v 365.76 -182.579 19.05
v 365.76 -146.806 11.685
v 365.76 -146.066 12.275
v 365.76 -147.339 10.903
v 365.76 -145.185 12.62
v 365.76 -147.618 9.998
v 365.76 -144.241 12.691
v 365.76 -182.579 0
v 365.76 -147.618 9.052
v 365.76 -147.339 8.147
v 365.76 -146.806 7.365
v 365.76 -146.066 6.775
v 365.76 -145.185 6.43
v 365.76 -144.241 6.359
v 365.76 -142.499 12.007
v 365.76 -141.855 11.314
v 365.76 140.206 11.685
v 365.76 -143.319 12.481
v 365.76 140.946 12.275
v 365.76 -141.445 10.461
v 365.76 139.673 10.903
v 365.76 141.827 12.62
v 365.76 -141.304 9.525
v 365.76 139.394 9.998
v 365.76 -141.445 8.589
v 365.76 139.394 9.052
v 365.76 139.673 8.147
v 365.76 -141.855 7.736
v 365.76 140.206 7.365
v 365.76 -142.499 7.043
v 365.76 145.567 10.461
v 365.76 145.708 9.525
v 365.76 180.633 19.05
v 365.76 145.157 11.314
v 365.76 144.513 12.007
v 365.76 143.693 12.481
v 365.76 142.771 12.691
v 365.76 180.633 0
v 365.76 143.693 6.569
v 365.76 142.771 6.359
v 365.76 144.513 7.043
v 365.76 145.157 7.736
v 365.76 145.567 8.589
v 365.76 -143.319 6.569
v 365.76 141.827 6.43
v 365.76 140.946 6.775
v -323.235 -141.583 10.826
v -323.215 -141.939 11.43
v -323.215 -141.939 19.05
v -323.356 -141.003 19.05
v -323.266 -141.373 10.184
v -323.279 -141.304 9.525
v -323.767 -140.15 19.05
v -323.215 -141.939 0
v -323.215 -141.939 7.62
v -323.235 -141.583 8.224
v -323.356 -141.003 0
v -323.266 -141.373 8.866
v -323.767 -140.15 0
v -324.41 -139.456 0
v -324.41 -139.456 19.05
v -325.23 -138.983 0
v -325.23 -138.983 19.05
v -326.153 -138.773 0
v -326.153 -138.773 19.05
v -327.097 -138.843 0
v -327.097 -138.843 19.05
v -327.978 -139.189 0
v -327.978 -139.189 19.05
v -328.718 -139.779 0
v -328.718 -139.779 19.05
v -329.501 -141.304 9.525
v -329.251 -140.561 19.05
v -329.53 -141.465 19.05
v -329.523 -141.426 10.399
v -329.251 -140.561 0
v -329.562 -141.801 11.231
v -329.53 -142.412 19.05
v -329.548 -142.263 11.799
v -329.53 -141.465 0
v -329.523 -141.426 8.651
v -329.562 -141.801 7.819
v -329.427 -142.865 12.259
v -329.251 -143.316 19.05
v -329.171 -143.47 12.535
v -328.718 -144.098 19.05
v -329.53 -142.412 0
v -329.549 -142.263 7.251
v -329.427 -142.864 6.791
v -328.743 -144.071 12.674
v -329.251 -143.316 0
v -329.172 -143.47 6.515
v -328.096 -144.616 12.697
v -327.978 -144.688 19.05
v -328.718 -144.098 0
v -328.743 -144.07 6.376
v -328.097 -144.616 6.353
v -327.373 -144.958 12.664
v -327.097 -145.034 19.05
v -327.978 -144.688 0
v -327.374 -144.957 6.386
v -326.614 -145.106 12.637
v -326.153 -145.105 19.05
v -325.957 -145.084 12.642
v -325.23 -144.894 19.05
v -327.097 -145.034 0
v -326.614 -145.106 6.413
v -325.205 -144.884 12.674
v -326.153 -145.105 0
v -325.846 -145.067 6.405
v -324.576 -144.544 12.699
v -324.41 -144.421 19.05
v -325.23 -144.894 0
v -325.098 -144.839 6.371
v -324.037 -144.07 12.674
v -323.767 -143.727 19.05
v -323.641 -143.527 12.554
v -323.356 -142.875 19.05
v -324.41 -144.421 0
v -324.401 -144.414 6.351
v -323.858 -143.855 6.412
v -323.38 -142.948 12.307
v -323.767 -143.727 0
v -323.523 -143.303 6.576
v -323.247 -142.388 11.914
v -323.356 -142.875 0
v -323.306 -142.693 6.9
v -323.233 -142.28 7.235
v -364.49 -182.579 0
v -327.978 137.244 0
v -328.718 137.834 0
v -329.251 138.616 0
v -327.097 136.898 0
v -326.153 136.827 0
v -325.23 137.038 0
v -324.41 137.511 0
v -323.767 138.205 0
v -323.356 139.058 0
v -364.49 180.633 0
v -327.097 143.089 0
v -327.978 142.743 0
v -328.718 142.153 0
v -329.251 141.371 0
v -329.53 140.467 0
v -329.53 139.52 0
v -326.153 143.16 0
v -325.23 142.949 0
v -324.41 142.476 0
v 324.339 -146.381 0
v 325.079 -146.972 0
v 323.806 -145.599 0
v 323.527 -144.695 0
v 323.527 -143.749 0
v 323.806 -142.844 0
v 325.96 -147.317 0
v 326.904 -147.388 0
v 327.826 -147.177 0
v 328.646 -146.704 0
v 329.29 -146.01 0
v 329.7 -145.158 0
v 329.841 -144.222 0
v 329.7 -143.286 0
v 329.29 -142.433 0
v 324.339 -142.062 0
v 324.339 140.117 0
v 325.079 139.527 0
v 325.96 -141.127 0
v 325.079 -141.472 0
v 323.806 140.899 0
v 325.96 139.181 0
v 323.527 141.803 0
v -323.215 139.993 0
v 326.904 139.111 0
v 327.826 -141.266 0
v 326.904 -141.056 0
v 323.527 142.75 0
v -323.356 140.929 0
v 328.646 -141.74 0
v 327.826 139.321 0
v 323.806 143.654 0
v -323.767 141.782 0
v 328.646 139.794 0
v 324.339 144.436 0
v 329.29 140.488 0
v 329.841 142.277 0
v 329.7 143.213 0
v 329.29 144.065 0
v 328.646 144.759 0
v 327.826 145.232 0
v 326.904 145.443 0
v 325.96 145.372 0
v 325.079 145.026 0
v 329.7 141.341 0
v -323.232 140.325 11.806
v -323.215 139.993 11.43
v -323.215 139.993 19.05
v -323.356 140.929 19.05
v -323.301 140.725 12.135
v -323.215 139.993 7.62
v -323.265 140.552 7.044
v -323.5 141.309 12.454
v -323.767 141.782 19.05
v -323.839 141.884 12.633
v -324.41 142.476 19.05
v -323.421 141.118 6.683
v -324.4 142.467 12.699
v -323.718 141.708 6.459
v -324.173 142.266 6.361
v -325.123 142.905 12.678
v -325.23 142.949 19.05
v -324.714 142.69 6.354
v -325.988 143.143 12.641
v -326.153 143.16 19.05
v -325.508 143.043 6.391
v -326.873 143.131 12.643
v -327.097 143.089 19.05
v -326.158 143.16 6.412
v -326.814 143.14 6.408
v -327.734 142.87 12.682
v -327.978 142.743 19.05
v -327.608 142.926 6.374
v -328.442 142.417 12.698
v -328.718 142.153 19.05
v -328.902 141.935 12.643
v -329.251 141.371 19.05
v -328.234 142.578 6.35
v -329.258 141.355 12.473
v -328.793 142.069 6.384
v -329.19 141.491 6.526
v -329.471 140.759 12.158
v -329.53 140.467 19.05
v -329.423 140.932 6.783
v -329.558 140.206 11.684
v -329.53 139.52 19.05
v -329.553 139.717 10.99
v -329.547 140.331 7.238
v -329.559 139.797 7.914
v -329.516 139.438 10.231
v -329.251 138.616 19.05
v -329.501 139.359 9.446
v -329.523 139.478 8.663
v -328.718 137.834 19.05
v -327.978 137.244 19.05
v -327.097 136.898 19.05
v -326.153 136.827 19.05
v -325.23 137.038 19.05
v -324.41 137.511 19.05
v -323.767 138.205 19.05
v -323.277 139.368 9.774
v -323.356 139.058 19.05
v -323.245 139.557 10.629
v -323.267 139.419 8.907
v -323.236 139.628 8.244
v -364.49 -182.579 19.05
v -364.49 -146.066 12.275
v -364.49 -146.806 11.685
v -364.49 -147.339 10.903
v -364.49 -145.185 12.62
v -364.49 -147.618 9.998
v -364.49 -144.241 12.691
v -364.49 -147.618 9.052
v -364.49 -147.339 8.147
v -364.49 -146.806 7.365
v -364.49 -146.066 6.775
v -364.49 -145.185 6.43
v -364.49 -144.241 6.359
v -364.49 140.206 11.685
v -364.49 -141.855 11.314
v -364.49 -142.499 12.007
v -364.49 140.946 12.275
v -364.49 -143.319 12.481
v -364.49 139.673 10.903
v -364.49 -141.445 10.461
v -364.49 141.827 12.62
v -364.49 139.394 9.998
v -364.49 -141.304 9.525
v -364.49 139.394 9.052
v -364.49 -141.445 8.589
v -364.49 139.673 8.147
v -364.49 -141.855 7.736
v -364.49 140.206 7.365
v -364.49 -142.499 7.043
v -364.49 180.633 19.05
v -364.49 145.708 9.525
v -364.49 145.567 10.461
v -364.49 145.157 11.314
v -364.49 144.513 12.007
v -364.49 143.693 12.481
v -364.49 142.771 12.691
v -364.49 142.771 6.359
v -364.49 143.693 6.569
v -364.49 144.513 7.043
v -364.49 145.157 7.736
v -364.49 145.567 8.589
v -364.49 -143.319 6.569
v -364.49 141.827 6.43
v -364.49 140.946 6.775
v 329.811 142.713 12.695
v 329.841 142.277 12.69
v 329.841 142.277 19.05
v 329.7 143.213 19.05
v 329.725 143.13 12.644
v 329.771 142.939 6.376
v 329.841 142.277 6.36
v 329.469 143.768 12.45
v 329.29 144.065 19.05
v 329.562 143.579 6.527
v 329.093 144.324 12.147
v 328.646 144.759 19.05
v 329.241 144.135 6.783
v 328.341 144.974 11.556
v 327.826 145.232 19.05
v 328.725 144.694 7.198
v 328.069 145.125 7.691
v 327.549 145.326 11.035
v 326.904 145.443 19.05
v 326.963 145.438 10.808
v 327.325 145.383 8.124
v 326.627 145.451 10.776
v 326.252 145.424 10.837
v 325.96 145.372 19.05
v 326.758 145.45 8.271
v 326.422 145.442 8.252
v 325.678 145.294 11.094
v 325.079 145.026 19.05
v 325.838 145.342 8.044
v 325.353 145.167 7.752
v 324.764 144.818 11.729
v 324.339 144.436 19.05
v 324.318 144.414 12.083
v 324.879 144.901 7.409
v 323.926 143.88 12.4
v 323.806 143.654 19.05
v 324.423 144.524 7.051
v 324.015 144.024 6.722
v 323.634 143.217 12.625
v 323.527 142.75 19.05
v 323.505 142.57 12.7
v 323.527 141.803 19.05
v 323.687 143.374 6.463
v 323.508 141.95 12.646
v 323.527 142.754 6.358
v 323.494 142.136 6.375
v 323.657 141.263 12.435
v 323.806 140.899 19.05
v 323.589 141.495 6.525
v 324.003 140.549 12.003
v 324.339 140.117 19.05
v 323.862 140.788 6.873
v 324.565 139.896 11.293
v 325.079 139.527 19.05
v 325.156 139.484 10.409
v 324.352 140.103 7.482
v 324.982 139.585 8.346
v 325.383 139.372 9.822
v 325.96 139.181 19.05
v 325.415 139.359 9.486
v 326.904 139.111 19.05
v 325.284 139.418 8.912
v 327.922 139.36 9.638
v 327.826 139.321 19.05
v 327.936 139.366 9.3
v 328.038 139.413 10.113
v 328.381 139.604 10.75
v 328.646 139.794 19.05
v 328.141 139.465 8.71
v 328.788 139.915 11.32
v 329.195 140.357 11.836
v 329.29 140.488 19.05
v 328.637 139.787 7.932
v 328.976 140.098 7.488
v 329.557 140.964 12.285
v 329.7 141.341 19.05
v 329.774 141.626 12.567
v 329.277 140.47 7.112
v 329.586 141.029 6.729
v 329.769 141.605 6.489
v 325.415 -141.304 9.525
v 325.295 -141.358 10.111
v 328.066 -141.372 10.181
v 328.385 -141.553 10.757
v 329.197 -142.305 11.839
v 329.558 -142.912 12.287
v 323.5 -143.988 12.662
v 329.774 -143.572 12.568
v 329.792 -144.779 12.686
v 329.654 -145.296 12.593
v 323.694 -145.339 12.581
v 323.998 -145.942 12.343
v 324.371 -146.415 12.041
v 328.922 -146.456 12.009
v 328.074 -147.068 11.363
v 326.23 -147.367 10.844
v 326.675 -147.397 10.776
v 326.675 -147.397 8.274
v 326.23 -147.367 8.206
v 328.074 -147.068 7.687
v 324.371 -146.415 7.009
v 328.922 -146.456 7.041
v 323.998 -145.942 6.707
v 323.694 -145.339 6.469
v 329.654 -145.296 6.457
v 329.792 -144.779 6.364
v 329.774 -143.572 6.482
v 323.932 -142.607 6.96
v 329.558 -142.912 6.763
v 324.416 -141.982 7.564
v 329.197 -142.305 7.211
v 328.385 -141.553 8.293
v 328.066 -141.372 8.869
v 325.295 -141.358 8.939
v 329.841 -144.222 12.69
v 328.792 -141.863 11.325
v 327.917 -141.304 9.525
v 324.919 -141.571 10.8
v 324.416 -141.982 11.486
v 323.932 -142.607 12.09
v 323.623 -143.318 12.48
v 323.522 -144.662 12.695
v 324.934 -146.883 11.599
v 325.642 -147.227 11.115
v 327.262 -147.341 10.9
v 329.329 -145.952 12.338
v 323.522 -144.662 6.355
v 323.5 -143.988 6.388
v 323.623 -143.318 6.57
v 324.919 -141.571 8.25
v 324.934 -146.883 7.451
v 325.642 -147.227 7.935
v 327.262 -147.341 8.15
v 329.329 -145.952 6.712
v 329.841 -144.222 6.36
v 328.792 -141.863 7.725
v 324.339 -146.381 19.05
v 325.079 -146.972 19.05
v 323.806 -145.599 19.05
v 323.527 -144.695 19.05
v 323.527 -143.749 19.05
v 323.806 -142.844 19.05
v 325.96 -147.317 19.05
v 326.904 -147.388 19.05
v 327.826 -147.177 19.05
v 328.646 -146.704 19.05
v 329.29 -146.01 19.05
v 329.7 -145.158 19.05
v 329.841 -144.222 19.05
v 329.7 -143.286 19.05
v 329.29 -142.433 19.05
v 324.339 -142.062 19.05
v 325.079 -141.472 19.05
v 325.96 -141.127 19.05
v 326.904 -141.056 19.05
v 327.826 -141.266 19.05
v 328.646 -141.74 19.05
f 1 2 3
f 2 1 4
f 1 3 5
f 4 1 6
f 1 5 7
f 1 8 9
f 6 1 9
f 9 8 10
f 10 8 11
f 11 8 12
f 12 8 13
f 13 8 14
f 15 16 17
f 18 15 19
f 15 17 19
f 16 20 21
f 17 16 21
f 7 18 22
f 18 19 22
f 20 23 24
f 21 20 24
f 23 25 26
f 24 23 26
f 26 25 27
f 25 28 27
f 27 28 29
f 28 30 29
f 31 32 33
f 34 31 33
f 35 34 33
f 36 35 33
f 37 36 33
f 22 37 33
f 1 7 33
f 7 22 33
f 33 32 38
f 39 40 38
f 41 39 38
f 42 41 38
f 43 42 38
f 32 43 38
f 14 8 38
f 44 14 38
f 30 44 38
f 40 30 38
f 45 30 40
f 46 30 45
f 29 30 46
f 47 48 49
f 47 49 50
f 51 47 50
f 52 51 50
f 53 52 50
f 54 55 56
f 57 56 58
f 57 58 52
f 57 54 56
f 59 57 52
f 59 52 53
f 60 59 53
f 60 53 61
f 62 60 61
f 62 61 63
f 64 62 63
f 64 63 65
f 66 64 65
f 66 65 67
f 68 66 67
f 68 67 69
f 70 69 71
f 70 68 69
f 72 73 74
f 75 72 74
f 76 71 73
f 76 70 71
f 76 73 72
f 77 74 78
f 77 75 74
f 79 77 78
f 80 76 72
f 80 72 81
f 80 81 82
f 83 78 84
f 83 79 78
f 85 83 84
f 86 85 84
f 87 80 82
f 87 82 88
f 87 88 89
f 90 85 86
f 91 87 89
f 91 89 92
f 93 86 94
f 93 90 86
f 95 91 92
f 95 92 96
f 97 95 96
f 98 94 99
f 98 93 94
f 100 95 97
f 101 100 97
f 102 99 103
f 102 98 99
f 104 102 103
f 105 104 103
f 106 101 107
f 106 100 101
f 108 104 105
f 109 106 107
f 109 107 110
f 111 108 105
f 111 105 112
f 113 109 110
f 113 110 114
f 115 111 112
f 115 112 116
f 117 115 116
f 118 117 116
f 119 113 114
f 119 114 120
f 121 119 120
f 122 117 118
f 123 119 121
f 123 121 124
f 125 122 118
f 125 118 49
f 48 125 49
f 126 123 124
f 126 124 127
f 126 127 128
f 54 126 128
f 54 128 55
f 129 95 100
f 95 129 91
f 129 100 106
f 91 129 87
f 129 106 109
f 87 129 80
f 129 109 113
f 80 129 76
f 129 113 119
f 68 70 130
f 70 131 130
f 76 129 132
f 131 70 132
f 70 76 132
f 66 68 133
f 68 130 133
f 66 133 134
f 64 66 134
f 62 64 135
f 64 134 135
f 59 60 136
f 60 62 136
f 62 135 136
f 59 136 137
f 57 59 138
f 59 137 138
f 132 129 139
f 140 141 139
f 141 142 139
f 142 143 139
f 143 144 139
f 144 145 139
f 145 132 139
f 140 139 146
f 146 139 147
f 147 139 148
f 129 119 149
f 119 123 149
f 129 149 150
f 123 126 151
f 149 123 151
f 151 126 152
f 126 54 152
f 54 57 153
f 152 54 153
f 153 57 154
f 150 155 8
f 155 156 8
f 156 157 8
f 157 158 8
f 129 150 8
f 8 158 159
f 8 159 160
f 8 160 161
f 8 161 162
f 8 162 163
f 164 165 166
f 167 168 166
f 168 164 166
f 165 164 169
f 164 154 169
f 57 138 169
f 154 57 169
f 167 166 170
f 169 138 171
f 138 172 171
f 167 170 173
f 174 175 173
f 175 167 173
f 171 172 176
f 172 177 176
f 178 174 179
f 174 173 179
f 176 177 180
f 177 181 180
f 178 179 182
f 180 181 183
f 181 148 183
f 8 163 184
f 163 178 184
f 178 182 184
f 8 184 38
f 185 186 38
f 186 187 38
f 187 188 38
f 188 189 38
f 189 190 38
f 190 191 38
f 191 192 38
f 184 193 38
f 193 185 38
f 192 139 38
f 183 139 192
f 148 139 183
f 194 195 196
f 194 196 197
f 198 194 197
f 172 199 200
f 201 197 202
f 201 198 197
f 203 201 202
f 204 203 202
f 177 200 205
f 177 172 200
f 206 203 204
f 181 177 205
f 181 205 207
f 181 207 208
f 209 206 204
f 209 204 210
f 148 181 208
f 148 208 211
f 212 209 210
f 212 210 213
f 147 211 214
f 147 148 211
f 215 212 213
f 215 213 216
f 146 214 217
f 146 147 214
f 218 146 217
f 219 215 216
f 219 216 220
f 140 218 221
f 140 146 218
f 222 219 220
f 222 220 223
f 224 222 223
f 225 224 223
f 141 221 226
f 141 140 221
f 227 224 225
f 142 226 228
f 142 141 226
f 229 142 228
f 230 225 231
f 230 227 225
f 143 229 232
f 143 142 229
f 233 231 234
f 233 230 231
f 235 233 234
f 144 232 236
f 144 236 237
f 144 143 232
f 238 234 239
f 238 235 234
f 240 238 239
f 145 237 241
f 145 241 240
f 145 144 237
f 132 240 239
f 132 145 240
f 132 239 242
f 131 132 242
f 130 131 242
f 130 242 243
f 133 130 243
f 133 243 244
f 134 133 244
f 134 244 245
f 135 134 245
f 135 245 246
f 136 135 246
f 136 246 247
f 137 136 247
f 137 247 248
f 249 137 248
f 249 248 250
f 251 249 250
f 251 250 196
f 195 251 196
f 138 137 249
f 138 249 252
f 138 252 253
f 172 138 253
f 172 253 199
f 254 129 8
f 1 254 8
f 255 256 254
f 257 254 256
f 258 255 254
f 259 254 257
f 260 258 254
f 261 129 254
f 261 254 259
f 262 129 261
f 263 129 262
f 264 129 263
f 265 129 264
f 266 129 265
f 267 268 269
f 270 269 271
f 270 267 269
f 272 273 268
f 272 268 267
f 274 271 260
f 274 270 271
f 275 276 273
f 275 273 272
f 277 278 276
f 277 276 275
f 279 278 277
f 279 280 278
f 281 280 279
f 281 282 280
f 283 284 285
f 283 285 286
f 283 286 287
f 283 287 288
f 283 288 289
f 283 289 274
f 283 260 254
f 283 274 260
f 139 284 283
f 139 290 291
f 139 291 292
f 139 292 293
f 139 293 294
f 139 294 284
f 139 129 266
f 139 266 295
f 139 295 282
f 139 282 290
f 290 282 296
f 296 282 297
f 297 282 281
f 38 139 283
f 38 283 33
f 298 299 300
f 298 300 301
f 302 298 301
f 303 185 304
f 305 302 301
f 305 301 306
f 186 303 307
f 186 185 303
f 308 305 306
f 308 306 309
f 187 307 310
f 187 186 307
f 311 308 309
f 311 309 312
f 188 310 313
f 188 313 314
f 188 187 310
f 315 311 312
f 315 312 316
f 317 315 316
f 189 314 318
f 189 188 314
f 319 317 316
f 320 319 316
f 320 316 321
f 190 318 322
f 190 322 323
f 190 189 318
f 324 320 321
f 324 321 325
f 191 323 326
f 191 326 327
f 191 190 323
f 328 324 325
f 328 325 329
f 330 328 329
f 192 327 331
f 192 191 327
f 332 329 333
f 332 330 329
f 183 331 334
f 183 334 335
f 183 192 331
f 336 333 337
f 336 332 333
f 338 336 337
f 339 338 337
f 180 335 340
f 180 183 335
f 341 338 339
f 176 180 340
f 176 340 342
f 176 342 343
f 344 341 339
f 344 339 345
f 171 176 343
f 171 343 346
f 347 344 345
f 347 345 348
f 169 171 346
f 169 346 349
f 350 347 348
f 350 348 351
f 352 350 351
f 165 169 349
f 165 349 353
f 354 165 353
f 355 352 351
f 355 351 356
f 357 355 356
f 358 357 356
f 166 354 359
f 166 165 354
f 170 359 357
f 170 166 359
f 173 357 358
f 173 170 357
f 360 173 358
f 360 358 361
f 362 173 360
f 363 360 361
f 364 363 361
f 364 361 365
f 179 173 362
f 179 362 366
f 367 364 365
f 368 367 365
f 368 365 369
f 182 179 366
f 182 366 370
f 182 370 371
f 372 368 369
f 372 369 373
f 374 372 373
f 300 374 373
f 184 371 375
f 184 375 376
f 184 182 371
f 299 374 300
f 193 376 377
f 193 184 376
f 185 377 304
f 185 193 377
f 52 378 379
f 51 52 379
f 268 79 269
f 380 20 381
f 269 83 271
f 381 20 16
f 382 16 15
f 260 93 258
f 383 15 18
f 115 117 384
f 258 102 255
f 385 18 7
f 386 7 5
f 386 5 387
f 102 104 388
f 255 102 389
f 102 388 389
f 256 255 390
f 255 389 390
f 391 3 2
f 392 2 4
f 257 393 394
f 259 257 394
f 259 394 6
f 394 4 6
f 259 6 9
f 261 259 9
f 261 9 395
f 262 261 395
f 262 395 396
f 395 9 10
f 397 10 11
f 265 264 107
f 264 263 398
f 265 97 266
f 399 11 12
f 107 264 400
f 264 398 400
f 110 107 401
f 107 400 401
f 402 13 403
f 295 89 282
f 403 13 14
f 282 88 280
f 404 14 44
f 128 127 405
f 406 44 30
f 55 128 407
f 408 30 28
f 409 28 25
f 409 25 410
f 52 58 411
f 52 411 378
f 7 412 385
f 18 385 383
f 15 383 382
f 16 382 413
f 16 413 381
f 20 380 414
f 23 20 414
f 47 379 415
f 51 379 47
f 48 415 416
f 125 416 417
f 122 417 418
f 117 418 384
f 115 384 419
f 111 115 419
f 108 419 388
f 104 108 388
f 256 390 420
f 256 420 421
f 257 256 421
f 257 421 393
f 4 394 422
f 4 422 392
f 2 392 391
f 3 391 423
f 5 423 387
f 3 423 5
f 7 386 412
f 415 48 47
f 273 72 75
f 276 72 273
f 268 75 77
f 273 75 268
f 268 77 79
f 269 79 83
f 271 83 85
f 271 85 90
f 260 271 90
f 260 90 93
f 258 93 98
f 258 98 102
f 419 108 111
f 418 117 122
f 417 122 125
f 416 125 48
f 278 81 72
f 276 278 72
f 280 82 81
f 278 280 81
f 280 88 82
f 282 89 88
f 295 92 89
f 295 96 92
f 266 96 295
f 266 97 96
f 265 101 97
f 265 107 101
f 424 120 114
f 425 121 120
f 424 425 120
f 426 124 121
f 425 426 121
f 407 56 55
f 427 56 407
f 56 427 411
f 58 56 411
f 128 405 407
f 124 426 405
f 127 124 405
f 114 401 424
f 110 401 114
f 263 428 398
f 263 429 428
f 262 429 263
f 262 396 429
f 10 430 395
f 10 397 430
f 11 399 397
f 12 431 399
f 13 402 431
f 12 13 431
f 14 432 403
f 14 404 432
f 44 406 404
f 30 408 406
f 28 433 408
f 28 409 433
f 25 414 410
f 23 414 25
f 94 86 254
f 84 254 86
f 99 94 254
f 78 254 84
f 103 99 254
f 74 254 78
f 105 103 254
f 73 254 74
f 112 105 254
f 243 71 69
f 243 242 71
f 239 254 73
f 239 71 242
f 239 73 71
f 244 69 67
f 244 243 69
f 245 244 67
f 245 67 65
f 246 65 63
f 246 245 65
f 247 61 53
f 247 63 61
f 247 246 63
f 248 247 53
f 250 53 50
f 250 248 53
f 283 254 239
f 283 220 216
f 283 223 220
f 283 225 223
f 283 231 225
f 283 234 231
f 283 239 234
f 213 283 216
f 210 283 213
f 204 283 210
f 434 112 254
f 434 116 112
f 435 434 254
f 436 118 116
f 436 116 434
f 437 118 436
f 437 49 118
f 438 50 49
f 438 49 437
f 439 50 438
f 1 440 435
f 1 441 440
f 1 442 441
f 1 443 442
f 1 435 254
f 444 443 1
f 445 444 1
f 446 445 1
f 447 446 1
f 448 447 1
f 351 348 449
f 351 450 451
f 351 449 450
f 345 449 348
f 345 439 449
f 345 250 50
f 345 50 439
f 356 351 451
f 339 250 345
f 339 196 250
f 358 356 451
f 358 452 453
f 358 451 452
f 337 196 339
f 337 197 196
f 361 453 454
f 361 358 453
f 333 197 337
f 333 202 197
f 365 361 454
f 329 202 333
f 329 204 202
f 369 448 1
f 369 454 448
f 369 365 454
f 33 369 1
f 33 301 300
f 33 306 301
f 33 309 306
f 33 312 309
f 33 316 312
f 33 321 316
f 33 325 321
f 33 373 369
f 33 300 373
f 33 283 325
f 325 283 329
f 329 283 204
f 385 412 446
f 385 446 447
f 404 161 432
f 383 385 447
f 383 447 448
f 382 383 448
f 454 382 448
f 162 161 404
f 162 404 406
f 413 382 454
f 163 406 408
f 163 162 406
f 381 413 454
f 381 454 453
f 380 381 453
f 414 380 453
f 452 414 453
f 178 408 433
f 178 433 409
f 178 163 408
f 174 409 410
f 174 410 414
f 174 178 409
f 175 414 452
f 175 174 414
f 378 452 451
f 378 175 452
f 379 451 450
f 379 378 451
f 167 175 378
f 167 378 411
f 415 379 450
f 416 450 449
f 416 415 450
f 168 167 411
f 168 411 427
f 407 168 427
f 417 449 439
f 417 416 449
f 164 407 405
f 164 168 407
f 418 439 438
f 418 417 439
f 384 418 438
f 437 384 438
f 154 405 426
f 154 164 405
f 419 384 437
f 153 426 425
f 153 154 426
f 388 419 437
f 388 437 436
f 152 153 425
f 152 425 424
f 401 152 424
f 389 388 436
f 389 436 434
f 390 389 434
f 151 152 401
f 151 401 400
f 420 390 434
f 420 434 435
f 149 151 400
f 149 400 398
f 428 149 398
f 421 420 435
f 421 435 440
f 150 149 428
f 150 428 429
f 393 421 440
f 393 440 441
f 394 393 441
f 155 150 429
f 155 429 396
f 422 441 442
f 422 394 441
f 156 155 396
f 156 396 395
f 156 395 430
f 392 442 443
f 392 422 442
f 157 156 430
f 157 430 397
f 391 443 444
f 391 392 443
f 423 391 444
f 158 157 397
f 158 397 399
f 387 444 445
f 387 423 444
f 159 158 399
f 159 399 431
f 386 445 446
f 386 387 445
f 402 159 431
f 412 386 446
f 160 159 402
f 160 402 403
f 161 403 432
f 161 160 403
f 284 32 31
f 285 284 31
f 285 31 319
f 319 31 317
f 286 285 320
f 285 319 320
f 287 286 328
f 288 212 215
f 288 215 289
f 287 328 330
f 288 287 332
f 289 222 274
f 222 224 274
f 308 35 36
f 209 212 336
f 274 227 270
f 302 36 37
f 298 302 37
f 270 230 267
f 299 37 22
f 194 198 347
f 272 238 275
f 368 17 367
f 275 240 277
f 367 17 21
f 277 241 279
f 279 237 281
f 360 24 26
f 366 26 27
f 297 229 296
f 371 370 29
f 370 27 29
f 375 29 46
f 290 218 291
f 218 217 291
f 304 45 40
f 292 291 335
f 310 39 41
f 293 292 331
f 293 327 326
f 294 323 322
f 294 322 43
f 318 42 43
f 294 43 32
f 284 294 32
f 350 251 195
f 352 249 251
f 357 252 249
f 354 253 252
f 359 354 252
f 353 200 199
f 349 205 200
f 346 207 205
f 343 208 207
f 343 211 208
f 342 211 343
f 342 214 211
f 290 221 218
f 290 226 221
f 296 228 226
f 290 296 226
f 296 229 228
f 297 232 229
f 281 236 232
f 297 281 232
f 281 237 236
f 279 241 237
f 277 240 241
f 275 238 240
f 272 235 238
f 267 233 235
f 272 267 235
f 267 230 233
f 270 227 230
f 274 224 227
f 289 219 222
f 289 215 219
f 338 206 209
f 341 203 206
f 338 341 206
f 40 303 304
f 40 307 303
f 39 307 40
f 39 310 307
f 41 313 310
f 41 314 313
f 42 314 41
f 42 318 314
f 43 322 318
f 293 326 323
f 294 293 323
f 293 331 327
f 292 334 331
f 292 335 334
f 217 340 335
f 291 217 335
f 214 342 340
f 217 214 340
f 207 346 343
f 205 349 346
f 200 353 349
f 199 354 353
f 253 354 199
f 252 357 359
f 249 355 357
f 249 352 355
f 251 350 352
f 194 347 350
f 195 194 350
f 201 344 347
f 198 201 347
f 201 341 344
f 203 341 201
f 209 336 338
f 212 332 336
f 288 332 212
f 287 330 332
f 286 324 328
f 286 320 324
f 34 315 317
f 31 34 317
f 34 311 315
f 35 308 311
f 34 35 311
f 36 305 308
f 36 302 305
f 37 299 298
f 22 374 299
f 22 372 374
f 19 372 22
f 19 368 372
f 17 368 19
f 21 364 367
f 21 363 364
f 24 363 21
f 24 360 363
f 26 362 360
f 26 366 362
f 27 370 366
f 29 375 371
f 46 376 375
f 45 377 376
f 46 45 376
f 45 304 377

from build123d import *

# Parameters (mm, degrees)
F0_W     = 730.25
F0_H     = 363.212101
F0_R     = 3.175
F1_DEPTH = 19.05
F3_R     = 3.175
F4_DEPTH = 805.434


with BuildPart() as f1:
    # F0 (on Top) → F1 (new body)
    with BuildSketch(Plane.XY):
        with Locations((0.634938, -0.972606)):
            Rectangle(F0_W, F0_H)
        with Locations((-326.390062, -141.938657)):
            Circle(F0_R, mode=Mode.SUBTRACT)
        with Locations((326.666253, -144.221899)):
            Circle(F0_R, mode=Mode.SUBTRACT)
        with Locations((-326.390062, 139.993444)):
            Circle(F0_R, mode=Mode.SUBTRACT)
        with Locations((326.666253, 142.276686)):
            Circle(F0_R, mode=Mode.SUBTRACT)
    extrude(amount=F1_DEPTH)

    # F3 (on offset) → F4 (cut)
    with BuildSketch(Plane.YZ.offset(373.38)):
        with Locations((-144.478657, 9.525)):
            Circle(F3_R)
        with Locations((142.533444, 9.525)):
            Circle(F3_R)
    extrude(amount=-F4_DEPTH, mode=Mode.SUBTRACT)


solid = f1.part
